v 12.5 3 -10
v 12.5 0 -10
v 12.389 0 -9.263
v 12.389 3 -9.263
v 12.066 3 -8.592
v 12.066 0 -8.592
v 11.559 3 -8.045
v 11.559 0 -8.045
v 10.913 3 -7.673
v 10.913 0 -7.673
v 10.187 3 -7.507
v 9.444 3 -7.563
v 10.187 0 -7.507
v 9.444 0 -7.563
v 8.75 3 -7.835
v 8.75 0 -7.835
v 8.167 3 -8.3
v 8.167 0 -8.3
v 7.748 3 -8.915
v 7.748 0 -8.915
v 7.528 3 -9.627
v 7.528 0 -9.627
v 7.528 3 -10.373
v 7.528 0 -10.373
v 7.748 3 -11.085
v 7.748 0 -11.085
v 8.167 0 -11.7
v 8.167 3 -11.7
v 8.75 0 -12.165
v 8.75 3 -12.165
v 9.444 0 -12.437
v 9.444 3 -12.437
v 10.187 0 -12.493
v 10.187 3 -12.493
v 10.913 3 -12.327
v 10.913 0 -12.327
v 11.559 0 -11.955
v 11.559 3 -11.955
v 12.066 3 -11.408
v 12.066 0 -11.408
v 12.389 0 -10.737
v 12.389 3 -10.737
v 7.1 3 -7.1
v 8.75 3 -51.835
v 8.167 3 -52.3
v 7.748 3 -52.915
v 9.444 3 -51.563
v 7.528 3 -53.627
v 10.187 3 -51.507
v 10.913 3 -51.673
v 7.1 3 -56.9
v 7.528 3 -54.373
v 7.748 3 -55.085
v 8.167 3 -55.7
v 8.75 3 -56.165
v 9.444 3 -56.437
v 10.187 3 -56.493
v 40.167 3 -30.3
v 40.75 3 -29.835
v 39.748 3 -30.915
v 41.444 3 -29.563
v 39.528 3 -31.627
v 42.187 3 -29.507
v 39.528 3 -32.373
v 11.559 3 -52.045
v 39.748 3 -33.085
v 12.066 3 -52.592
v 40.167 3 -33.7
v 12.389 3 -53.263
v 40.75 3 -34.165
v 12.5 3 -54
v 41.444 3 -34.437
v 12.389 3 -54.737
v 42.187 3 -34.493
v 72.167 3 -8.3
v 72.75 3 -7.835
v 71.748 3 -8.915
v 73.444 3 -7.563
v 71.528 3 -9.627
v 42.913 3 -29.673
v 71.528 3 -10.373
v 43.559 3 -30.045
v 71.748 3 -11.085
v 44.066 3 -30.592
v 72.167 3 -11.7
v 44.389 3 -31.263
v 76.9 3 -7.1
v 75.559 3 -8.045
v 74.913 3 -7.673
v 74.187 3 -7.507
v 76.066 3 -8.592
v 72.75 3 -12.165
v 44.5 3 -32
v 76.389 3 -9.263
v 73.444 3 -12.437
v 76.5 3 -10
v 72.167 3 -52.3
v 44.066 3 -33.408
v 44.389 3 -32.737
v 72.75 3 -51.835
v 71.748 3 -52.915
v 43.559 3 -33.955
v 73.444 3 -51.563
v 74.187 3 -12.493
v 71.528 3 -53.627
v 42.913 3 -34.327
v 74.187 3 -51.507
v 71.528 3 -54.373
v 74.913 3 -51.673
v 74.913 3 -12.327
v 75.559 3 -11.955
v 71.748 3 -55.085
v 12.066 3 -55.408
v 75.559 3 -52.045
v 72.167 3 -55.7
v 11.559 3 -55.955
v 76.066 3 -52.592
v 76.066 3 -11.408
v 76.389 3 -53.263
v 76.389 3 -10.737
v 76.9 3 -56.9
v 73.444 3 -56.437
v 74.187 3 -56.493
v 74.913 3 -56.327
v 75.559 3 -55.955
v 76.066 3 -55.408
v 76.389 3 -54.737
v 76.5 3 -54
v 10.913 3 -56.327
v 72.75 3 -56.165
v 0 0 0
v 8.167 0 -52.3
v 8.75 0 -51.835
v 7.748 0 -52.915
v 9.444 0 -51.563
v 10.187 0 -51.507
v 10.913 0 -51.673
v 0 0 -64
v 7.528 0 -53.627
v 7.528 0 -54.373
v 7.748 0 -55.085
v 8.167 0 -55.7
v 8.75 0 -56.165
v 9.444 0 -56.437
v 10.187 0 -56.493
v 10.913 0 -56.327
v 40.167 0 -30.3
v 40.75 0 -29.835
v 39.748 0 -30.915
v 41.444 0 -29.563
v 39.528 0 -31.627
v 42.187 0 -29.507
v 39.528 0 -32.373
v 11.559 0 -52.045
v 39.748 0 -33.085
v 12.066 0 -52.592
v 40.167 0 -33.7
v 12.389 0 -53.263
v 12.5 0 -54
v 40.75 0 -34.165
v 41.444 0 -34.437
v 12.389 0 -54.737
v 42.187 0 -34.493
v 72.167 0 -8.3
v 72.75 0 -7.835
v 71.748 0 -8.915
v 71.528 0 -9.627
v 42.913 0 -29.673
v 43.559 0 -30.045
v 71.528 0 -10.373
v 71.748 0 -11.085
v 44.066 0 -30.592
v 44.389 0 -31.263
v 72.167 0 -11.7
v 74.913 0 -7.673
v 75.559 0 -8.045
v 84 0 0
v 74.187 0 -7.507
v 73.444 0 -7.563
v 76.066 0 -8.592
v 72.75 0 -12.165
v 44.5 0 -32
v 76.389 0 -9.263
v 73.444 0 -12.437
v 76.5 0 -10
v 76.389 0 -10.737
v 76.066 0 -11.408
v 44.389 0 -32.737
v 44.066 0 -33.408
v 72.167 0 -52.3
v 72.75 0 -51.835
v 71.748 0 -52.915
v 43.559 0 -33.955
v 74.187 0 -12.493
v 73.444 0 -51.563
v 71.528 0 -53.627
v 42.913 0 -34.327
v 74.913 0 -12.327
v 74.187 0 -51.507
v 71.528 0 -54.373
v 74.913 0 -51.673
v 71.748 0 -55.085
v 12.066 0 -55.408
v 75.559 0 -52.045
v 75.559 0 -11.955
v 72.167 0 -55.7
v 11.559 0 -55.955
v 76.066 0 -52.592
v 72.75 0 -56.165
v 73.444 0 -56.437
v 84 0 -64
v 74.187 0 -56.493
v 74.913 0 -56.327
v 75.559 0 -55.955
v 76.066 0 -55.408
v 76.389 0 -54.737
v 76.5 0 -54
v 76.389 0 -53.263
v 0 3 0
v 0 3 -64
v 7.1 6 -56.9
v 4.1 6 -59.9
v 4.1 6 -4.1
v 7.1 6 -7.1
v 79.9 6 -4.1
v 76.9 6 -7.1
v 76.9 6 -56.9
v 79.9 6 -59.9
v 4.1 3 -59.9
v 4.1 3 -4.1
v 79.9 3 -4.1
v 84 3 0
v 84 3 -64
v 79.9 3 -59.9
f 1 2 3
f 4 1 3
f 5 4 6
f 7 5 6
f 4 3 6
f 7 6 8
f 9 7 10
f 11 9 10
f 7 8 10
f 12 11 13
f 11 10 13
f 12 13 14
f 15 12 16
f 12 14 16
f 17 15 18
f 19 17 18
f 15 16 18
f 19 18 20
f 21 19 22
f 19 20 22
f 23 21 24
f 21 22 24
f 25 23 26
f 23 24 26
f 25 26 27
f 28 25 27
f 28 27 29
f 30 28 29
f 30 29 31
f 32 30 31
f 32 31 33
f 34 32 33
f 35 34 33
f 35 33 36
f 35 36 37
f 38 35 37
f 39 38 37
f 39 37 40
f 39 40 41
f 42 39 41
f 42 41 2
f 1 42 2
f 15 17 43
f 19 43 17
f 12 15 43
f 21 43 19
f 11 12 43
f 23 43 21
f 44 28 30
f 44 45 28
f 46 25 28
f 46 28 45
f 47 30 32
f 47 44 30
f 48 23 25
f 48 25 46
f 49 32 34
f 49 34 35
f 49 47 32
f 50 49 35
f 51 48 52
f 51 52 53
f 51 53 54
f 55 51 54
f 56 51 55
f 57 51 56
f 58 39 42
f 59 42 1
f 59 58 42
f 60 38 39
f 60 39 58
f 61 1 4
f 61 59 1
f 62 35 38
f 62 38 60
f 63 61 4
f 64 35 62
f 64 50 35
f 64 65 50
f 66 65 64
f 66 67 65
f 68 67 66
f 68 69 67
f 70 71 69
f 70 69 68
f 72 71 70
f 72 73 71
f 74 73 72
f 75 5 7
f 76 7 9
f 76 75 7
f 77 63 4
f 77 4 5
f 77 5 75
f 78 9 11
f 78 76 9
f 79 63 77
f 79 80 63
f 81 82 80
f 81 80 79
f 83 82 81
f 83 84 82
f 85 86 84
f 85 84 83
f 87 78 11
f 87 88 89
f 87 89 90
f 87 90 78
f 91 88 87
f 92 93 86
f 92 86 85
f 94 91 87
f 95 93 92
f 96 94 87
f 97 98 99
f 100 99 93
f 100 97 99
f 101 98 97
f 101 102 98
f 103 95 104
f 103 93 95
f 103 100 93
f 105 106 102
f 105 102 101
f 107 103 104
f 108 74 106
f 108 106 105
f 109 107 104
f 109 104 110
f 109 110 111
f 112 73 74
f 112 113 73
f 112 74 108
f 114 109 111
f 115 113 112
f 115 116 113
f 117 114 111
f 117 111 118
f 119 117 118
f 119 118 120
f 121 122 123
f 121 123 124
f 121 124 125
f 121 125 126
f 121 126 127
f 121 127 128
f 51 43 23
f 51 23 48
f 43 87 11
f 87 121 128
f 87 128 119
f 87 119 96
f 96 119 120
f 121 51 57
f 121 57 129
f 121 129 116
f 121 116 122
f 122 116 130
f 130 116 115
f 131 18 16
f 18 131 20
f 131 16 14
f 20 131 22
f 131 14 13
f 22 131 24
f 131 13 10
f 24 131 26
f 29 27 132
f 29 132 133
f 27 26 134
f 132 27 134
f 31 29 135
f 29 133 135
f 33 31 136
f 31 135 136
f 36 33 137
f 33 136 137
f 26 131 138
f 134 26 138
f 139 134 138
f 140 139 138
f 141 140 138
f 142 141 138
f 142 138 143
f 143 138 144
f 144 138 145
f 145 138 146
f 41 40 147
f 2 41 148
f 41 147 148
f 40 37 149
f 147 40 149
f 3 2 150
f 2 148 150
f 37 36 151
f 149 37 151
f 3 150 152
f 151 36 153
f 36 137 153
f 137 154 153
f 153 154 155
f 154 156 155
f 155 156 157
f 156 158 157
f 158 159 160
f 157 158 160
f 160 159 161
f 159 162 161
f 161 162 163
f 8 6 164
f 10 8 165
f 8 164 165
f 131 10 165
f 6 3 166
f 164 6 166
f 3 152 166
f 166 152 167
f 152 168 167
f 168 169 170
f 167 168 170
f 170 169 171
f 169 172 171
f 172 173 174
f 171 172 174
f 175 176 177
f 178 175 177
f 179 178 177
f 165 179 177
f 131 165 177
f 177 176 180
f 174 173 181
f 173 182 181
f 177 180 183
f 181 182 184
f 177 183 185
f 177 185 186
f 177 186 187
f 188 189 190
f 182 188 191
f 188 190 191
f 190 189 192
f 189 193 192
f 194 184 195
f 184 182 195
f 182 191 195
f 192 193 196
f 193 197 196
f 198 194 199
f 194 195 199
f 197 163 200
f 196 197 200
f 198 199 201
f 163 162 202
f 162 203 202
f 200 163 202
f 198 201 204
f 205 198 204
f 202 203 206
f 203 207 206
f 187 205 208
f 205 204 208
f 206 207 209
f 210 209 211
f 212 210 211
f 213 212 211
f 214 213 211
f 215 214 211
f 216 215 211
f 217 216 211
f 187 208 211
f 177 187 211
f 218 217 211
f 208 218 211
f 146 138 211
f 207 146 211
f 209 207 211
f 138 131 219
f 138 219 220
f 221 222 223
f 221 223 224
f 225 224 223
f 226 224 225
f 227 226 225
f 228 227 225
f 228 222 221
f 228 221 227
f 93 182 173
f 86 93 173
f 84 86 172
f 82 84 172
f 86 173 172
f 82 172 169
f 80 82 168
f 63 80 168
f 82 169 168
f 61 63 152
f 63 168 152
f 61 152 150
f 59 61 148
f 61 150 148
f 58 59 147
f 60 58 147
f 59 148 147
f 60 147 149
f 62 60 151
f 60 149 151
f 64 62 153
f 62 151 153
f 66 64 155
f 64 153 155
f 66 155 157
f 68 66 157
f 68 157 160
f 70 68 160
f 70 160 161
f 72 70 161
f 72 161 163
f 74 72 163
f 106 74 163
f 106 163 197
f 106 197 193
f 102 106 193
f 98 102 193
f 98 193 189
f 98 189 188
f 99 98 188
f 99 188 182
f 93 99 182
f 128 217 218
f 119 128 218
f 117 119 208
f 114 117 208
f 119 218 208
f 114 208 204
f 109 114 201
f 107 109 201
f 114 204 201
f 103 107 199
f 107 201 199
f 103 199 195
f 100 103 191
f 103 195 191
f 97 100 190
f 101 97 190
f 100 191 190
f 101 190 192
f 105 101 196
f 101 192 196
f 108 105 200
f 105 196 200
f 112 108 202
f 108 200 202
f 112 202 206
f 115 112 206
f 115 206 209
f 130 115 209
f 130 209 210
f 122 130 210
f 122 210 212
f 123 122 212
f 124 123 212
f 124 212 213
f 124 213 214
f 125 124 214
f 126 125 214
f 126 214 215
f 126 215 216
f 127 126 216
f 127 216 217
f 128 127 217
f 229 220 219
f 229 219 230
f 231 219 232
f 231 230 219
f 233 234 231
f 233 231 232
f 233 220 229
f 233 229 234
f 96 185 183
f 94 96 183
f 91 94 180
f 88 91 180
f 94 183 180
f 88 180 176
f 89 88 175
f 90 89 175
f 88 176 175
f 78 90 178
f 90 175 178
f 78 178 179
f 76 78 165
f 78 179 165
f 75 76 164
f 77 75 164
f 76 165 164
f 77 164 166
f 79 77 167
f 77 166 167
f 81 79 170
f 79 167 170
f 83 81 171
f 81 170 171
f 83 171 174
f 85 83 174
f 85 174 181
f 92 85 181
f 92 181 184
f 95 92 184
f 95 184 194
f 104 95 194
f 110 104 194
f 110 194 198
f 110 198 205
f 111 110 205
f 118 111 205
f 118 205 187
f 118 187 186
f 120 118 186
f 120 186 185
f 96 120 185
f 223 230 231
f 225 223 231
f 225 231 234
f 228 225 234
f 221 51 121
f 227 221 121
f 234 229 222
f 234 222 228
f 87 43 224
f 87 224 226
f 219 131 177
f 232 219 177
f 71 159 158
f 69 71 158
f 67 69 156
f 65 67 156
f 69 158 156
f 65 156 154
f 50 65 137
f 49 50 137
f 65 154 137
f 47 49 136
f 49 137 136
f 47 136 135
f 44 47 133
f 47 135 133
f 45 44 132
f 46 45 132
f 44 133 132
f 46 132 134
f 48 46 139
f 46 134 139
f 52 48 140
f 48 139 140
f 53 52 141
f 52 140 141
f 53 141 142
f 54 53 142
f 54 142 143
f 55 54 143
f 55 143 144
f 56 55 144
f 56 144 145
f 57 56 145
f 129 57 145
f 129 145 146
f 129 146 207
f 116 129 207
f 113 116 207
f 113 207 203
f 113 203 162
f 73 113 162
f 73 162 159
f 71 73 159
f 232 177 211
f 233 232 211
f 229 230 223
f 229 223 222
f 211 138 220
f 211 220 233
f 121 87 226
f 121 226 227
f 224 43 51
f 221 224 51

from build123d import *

# Parameters (mm, degrees)
CROQUIS1_W              = 84
CROQUIS1_H              = 64
SALIENTE_EXTRUIR1_DEPTH = 3
CROQUIS2_W              = 75.8
CROQUIS2_H              = 55.8
CROQUIS2_W_2            = 69.8
CROQUIS2_H_2            = 49.8
SALIENTE_EXTRUIR2_DEPTH = 3
CROQUIS3_R              = 2.5
CORTAR_EXTRUIR1_DEPTH   = 7


with BuildPart() as part:
    # Croquis1 → Saliente-Extruir1 (new body)
    with BuildSketch(Plane(origin=(0, 0, 0), x_dir=(1, 0, 0), z_dir=(0, 1, 0))):
        with Locations((42, 32)):
            Rectangle(CROQUIS1_W, CROQUIS1_H)
    extrude(amount=SALIENTE_EXTRUIR1_DEPTH)

    # Croquis2 → Saliente-Extruir2 (add)
    with BuildSketch(Plane(origin=(0, 3, 0), x_dir=(1, 0, 0), z_dir=(0, 1, 0))):
        with Locations((42, 32)):
            Rectangle(CROQUIS2_W, CROQUIS2_H)
        with Locations((42, 32)):
            Rectangle(CROQUIS2_W_2, CROQUIS2_H_2, mode=Mode.SUBTRACT)
    extrude(amount=SALIENTE_EXTRUIR2_DEPTH)

    # Croquis3 → Cortar-Extruir1 (cut, through all)
    with BuildSketch(Plane.XZ):
        with Locations((42, -32)):
            Circle(CROQUIS3_R)
        with Locations((10, -10)):
            Circle(CROQUIS3_R)
        with Locations((74, -10)):
            Circle(CROQUIS3_R)
        with Locations((74, -54)):
            Circle(CROQUIS3_R)
        with Locations((10, -54)):
            Circle(CROQUIS3_R)
    extrude(amount=-CORTAR_EXTRUIR1_DEPTH, mode=Mode.SUBTRACT)


solid = part.part
